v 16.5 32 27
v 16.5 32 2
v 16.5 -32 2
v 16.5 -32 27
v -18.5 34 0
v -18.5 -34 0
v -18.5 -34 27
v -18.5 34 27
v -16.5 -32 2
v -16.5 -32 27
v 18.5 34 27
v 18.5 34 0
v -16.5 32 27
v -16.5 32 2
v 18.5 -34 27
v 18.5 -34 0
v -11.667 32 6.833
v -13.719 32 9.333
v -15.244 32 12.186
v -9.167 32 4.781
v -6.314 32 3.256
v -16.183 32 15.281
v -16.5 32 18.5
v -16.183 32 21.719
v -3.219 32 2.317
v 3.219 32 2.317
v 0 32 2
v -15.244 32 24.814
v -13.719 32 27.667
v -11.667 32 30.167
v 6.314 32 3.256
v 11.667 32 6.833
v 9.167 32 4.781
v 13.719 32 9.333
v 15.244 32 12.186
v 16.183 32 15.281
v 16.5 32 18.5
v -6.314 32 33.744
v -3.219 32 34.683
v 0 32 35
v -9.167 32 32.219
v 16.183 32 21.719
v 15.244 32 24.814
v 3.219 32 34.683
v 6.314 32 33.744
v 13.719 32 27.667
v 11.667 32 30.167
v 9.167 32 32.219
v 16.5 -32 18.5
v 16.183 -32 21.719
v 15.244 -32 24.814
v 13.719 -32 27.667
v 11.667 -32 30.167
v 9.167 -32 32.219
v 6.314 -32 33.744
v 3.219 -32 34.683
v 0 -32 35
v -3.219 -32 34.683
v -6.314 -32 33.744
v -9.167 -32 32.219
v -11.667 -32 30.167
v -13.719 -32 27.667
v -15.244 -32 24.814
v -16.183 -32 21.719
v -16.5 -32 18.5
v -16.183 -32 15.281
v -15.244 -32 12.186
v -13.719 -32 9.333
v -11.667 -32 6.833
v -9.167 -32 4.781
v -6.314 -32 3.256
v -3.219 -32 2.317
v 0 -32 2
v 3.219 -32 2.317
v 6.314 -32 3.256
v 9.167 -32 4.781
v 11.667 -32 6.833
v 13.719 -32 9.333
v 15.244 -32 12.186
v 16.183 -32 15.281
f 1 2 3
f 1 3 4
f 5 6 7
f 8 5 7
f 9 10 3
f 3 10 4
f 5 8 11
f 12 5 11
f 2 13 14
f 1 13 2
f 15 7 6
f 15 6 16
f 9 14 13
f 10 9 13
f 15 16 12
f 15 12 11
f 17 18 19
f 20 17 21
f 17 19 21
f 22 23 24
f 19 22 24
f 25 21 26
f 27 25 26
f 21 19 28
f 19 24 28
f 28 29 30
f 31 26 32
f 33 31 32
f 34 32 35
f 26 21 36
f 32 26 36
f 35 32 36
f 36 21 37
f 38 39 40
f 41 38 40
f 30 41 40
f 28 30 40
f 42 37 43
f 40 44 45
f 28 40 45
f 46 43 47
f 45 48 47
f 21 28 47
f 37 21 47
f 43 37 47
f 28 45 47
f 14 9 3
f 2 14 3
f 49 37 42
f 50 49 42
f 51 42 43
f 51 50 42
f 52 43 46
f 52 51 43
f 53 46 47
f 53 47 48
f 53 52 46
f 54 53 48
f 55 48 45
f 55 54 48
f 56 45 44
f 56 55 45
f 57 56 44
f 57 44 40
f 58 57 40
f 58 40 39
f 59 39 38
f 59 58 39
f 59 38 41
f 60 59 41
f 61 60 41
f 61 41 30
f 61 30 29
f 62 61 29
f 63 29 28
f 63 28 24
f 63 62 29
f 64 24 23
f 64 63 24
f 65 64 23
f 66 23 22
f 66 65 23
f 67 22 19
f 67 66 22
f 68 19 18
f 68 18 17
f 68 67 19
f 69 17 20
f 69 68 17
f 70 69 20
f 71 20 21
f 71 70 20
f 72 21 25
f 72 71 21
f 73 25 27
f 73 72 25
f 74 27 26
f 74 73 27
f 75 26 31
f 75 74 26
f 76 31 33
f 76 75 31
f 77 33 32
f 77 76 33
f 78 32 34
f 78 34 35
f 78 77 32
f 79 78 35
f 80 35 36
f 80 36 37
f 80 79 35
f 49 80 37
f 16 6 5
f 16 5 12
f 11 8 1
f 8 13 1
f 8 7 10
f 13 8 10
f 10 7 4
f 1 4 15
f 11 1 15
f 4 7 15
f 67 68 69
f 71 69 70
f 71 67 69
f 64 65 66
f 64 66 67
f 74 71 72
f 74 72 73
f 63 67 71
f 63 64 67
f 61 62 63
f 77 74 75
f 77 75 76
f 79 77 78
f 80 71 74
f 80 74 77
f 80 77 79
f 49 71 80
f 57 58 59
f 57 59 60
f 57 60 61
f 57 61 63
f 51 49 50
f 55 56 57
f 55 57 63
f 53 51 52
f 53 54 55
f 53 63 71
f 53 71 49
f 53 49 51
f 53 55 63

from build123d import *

# Parameters (mm, degrees)
F0_R     = 16.5
F1_DEPTH = 32
F2_W     = 37
F2_H     = 27
F3_DEPTH = 34
F4_T     = -2


with BuildPart() as f1:
    # F0 (on Front) → F1 (new body, symmetric)
    with BuildSketch(Plane.XZ):
        with Locations((0, 18.5)):
            Circle(F0_R)
    extrude(amount=F1_DEPTH, both=True)


with BuildPart() as f3:
    # F2 (on Front) → F3 (new body, symmetric)
    with BuildSketch(Plane.XZ):
        with Locations((0, 13.5)):
            Rectangle(F2_W, F2_H)
    extrude(amount=F3_DEPTH, both=True)

    # F4
    f4_openings = [f3.faces().sort_by_distance(p)[0] for p in [
        (0, 0, 27),
    ]]
    offset(amount=F4_T, openings=f4_openings)


solid = Compound([f1.part, f3.part])
